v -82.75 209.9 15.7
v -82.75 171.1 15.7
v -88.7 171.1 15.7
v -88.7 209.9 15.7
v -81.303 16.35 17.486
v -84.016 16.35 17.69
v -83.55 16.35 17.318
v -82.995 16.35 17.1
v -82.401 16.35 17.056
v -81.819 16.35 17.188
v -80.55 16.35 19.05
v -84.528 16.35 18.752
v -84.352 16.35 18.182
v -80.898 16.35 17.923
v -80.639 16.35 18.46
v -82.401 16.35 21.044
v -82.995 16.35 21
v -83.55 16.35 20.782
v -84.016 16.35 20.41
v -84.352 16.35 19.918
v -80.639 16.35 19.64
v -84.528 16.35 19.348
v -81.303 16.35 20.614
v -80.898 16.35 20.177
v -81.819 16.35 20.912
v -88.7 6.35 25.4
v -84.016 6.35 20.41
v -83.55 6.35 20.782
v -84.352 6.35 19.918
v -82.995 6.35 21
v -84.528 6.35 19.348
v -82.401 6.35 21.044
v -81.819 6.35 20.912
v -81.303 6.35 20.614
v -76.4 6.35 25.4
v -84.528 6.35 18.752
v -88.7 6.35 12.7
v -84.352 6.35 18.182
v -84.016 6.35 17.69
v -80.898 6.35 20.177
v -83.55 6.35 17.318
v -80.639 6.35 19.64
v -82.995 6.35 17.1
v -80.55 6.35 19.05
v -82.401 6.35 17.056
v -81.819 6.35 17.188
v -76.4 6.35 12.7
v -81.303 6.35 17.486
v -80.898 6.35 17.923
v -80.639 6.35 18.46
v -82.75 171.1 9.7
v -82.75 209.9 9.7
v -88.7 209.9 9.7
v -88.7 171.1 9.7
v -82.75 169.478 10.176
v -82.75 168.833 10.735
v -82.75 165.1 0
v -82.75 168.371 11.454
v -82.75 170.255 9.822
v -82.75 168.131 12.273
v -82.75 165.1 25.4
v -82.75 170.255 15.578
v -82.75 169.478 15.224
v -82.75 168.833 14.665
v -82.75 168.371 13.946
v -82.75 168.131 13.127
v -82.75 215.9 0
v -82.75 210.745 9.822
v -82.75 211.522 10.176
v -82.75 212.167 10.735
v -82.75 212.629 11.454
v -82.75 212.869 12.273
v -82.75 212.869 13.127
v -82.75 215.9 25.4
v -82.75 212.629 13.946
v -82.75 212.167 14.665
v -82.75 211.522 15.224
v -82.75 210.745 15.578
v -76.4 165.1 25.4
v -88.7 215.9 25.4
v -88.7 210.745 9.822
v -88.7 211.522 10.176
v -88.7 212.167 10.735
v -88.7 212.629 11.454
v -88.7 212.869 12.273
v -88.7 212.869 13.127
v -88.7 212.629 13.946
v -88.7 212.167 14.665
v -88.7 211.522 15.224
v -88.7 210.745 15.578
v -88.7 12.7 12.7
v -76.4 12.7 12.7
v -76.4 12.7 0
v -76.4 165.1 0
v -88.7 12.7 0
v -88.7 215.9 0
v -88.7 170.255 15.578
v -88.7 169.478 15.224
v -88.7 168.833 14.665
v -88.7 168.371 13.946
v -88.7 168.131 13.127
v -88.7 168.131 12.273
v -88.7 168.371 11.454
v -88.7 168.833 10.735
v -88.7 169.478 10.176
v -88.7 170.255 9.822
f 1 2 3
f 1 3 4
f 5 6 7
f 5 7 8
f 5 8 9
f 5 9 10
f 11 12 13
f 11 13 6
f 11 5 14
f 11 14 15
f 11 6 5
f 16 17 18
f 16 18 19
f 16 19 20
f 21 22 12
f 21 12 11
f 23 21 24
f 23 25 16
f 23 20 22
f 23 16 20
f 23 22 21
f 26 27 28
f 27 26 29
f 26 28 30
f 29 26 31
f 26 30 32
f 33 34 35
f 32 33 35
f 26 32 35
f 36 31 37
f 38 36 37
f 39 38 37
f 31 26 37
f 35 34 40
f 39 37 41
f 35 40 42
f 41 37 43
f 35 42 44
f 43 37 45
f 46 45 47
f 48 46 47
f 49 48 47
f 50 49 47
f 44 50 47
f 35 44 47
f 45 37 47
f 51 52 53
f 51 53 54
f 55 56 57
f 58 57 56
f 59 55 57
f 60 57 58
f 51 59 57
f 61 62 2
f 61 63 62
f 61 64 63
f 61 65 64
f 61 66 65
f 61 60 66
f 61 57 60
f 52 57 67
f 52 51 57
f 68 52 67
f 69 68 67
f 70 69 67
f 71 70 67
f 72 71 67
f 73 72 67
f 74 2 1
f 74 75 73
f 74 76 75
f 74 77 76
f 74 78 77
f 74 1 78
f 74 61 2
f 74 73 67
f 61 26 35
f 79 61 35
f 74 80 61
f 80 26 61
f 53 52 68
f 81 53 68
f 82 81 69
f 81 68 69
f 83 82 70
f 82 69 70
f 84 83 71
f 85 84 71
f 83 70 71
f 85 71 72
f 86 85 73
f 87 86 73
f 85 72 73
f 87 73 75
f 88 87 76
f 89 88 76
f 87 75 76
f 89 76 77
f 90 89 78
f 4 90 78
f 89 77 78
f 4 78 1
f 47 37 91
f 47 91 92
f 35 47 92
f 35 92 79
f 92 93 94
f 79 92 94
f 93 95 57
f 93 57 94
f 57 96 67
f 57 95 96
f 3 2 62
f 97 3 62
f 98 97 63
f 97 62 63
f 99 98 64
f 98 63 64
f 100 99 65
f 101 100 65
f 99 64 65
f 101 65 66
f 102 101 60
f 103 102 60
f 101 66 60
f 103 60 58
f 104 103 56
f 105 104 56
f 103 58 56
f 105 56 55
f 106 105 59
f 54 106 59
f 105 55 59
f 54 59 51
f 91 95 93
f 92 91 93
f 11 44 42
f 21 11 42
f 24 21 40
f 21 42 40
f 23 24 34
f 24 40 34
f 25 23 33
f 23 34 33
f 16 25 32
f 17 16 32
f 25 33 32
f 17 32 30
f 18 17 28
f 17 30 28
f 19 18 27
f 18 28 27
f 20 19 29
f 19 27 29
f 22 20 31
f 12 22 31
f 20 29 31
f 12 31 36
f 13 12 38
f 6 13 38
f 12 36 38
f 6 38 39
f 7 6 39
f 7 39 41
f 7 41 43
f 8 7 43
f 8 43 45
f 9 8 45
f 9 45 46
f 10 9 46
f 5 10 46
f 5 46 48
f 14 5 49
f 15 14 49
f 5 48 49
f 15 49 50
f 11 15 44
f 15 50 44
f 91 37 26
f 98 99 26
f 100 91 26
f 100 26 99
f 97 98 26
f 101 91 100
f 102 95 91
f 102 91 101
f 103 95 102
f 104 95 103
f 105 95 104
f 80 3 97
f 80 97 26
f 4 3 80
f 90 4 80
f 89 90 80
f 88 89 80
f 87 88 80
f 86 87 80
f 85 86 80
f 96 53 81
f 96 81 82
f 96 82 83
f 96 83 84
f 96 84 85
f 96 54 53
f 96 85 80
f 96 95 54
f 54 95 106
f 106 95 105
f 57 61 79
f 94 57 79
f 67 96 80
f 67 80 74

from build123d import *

# Parameters (mm, degrees)
SKETCH009_W     = 12.3
SKETCH009_H     = 209.55
PAD002_DEPTH    = 25.4
SKETCH010_W     = 12.3
SKETCH010_H     = 6.35
POCKET007_DEPTH = 12.7
SKETCH011_R     = 2
POCKET008_DEPTH = 10
SKETCH012_W     = 6.35
SKETCH012_H     = 50.8
POCKET009_DEPTH = 25.401
POCKET010_DEPTH = 5.951


with BuildPart() as part:
    # Sketch009 → Pad002 (new body)
    with BuildSketch(Plane.XY):
        with Locations((-82.55, 111.125)):
            Rectangle(SKETCH009_W, SKETCH009_H)
    extrude(amount=PAD002_DEPTH)

    # Sketch010 (on Face5 of Pad002) → Pocket007 (cut)
    with BuildSketch(Plane(origin=(0, 0, 0), x_dir=(1, 0, 0), z_dir=(0, 0, -1))):
        with Locations((-82.55, -9.525)):
            Rectangle(SKETCH010_W, SKETCH010_H)
    extrude(amount=-POCKET007_DEPTH, mode=Mode.SUBTRACT)

    # Sketch011 (on Face1 of Pocket007) → Pocket008 (cut)
    with BuildSketch(Plane.XZ.offset(-6.35)):
        with Locations((-82.55, 19.05)):
            Circle(SKETCH011_R)
    extrude(amount=-POCKET008_DEPTH, mode=Mode.SUBTRACT)

    # Sketch012 (on Face5 of Pocket008) → Pocket009 (cut, through all)
    with BuildSketch(Plane.XY.offset(25.4)):
        with Locations((-79.575, 190.5)):
            Rectangle(SKETCH012_W, SKETCH012_H)
    extrude(amount=-POCKET009_DEPTH, mode=Mode.SUBTRACT)

    # Sketch013 (on Face11 of Pocket009) → Pocket010 (cut, through all)
    with BuildSketch(Plane.YZ.offset(-82.75)):
        with BuildLine():
            Line((171.1, 15.7), (209.9, 15.7))
            ThreePointArc((209.9, 9.7), (212.9, 12.7), (209.9, 15.7))
            Line((209.9, 9.7), (171.1, 9.7))
            ThreePointArc((171.1, 15.7), (168.1, 12.7), (171.1, 9.7))
        make_face()
    extrude(amount=-POCKET010_DEPTH, mode=Mode.SUBTRACT)


solid = part.part
